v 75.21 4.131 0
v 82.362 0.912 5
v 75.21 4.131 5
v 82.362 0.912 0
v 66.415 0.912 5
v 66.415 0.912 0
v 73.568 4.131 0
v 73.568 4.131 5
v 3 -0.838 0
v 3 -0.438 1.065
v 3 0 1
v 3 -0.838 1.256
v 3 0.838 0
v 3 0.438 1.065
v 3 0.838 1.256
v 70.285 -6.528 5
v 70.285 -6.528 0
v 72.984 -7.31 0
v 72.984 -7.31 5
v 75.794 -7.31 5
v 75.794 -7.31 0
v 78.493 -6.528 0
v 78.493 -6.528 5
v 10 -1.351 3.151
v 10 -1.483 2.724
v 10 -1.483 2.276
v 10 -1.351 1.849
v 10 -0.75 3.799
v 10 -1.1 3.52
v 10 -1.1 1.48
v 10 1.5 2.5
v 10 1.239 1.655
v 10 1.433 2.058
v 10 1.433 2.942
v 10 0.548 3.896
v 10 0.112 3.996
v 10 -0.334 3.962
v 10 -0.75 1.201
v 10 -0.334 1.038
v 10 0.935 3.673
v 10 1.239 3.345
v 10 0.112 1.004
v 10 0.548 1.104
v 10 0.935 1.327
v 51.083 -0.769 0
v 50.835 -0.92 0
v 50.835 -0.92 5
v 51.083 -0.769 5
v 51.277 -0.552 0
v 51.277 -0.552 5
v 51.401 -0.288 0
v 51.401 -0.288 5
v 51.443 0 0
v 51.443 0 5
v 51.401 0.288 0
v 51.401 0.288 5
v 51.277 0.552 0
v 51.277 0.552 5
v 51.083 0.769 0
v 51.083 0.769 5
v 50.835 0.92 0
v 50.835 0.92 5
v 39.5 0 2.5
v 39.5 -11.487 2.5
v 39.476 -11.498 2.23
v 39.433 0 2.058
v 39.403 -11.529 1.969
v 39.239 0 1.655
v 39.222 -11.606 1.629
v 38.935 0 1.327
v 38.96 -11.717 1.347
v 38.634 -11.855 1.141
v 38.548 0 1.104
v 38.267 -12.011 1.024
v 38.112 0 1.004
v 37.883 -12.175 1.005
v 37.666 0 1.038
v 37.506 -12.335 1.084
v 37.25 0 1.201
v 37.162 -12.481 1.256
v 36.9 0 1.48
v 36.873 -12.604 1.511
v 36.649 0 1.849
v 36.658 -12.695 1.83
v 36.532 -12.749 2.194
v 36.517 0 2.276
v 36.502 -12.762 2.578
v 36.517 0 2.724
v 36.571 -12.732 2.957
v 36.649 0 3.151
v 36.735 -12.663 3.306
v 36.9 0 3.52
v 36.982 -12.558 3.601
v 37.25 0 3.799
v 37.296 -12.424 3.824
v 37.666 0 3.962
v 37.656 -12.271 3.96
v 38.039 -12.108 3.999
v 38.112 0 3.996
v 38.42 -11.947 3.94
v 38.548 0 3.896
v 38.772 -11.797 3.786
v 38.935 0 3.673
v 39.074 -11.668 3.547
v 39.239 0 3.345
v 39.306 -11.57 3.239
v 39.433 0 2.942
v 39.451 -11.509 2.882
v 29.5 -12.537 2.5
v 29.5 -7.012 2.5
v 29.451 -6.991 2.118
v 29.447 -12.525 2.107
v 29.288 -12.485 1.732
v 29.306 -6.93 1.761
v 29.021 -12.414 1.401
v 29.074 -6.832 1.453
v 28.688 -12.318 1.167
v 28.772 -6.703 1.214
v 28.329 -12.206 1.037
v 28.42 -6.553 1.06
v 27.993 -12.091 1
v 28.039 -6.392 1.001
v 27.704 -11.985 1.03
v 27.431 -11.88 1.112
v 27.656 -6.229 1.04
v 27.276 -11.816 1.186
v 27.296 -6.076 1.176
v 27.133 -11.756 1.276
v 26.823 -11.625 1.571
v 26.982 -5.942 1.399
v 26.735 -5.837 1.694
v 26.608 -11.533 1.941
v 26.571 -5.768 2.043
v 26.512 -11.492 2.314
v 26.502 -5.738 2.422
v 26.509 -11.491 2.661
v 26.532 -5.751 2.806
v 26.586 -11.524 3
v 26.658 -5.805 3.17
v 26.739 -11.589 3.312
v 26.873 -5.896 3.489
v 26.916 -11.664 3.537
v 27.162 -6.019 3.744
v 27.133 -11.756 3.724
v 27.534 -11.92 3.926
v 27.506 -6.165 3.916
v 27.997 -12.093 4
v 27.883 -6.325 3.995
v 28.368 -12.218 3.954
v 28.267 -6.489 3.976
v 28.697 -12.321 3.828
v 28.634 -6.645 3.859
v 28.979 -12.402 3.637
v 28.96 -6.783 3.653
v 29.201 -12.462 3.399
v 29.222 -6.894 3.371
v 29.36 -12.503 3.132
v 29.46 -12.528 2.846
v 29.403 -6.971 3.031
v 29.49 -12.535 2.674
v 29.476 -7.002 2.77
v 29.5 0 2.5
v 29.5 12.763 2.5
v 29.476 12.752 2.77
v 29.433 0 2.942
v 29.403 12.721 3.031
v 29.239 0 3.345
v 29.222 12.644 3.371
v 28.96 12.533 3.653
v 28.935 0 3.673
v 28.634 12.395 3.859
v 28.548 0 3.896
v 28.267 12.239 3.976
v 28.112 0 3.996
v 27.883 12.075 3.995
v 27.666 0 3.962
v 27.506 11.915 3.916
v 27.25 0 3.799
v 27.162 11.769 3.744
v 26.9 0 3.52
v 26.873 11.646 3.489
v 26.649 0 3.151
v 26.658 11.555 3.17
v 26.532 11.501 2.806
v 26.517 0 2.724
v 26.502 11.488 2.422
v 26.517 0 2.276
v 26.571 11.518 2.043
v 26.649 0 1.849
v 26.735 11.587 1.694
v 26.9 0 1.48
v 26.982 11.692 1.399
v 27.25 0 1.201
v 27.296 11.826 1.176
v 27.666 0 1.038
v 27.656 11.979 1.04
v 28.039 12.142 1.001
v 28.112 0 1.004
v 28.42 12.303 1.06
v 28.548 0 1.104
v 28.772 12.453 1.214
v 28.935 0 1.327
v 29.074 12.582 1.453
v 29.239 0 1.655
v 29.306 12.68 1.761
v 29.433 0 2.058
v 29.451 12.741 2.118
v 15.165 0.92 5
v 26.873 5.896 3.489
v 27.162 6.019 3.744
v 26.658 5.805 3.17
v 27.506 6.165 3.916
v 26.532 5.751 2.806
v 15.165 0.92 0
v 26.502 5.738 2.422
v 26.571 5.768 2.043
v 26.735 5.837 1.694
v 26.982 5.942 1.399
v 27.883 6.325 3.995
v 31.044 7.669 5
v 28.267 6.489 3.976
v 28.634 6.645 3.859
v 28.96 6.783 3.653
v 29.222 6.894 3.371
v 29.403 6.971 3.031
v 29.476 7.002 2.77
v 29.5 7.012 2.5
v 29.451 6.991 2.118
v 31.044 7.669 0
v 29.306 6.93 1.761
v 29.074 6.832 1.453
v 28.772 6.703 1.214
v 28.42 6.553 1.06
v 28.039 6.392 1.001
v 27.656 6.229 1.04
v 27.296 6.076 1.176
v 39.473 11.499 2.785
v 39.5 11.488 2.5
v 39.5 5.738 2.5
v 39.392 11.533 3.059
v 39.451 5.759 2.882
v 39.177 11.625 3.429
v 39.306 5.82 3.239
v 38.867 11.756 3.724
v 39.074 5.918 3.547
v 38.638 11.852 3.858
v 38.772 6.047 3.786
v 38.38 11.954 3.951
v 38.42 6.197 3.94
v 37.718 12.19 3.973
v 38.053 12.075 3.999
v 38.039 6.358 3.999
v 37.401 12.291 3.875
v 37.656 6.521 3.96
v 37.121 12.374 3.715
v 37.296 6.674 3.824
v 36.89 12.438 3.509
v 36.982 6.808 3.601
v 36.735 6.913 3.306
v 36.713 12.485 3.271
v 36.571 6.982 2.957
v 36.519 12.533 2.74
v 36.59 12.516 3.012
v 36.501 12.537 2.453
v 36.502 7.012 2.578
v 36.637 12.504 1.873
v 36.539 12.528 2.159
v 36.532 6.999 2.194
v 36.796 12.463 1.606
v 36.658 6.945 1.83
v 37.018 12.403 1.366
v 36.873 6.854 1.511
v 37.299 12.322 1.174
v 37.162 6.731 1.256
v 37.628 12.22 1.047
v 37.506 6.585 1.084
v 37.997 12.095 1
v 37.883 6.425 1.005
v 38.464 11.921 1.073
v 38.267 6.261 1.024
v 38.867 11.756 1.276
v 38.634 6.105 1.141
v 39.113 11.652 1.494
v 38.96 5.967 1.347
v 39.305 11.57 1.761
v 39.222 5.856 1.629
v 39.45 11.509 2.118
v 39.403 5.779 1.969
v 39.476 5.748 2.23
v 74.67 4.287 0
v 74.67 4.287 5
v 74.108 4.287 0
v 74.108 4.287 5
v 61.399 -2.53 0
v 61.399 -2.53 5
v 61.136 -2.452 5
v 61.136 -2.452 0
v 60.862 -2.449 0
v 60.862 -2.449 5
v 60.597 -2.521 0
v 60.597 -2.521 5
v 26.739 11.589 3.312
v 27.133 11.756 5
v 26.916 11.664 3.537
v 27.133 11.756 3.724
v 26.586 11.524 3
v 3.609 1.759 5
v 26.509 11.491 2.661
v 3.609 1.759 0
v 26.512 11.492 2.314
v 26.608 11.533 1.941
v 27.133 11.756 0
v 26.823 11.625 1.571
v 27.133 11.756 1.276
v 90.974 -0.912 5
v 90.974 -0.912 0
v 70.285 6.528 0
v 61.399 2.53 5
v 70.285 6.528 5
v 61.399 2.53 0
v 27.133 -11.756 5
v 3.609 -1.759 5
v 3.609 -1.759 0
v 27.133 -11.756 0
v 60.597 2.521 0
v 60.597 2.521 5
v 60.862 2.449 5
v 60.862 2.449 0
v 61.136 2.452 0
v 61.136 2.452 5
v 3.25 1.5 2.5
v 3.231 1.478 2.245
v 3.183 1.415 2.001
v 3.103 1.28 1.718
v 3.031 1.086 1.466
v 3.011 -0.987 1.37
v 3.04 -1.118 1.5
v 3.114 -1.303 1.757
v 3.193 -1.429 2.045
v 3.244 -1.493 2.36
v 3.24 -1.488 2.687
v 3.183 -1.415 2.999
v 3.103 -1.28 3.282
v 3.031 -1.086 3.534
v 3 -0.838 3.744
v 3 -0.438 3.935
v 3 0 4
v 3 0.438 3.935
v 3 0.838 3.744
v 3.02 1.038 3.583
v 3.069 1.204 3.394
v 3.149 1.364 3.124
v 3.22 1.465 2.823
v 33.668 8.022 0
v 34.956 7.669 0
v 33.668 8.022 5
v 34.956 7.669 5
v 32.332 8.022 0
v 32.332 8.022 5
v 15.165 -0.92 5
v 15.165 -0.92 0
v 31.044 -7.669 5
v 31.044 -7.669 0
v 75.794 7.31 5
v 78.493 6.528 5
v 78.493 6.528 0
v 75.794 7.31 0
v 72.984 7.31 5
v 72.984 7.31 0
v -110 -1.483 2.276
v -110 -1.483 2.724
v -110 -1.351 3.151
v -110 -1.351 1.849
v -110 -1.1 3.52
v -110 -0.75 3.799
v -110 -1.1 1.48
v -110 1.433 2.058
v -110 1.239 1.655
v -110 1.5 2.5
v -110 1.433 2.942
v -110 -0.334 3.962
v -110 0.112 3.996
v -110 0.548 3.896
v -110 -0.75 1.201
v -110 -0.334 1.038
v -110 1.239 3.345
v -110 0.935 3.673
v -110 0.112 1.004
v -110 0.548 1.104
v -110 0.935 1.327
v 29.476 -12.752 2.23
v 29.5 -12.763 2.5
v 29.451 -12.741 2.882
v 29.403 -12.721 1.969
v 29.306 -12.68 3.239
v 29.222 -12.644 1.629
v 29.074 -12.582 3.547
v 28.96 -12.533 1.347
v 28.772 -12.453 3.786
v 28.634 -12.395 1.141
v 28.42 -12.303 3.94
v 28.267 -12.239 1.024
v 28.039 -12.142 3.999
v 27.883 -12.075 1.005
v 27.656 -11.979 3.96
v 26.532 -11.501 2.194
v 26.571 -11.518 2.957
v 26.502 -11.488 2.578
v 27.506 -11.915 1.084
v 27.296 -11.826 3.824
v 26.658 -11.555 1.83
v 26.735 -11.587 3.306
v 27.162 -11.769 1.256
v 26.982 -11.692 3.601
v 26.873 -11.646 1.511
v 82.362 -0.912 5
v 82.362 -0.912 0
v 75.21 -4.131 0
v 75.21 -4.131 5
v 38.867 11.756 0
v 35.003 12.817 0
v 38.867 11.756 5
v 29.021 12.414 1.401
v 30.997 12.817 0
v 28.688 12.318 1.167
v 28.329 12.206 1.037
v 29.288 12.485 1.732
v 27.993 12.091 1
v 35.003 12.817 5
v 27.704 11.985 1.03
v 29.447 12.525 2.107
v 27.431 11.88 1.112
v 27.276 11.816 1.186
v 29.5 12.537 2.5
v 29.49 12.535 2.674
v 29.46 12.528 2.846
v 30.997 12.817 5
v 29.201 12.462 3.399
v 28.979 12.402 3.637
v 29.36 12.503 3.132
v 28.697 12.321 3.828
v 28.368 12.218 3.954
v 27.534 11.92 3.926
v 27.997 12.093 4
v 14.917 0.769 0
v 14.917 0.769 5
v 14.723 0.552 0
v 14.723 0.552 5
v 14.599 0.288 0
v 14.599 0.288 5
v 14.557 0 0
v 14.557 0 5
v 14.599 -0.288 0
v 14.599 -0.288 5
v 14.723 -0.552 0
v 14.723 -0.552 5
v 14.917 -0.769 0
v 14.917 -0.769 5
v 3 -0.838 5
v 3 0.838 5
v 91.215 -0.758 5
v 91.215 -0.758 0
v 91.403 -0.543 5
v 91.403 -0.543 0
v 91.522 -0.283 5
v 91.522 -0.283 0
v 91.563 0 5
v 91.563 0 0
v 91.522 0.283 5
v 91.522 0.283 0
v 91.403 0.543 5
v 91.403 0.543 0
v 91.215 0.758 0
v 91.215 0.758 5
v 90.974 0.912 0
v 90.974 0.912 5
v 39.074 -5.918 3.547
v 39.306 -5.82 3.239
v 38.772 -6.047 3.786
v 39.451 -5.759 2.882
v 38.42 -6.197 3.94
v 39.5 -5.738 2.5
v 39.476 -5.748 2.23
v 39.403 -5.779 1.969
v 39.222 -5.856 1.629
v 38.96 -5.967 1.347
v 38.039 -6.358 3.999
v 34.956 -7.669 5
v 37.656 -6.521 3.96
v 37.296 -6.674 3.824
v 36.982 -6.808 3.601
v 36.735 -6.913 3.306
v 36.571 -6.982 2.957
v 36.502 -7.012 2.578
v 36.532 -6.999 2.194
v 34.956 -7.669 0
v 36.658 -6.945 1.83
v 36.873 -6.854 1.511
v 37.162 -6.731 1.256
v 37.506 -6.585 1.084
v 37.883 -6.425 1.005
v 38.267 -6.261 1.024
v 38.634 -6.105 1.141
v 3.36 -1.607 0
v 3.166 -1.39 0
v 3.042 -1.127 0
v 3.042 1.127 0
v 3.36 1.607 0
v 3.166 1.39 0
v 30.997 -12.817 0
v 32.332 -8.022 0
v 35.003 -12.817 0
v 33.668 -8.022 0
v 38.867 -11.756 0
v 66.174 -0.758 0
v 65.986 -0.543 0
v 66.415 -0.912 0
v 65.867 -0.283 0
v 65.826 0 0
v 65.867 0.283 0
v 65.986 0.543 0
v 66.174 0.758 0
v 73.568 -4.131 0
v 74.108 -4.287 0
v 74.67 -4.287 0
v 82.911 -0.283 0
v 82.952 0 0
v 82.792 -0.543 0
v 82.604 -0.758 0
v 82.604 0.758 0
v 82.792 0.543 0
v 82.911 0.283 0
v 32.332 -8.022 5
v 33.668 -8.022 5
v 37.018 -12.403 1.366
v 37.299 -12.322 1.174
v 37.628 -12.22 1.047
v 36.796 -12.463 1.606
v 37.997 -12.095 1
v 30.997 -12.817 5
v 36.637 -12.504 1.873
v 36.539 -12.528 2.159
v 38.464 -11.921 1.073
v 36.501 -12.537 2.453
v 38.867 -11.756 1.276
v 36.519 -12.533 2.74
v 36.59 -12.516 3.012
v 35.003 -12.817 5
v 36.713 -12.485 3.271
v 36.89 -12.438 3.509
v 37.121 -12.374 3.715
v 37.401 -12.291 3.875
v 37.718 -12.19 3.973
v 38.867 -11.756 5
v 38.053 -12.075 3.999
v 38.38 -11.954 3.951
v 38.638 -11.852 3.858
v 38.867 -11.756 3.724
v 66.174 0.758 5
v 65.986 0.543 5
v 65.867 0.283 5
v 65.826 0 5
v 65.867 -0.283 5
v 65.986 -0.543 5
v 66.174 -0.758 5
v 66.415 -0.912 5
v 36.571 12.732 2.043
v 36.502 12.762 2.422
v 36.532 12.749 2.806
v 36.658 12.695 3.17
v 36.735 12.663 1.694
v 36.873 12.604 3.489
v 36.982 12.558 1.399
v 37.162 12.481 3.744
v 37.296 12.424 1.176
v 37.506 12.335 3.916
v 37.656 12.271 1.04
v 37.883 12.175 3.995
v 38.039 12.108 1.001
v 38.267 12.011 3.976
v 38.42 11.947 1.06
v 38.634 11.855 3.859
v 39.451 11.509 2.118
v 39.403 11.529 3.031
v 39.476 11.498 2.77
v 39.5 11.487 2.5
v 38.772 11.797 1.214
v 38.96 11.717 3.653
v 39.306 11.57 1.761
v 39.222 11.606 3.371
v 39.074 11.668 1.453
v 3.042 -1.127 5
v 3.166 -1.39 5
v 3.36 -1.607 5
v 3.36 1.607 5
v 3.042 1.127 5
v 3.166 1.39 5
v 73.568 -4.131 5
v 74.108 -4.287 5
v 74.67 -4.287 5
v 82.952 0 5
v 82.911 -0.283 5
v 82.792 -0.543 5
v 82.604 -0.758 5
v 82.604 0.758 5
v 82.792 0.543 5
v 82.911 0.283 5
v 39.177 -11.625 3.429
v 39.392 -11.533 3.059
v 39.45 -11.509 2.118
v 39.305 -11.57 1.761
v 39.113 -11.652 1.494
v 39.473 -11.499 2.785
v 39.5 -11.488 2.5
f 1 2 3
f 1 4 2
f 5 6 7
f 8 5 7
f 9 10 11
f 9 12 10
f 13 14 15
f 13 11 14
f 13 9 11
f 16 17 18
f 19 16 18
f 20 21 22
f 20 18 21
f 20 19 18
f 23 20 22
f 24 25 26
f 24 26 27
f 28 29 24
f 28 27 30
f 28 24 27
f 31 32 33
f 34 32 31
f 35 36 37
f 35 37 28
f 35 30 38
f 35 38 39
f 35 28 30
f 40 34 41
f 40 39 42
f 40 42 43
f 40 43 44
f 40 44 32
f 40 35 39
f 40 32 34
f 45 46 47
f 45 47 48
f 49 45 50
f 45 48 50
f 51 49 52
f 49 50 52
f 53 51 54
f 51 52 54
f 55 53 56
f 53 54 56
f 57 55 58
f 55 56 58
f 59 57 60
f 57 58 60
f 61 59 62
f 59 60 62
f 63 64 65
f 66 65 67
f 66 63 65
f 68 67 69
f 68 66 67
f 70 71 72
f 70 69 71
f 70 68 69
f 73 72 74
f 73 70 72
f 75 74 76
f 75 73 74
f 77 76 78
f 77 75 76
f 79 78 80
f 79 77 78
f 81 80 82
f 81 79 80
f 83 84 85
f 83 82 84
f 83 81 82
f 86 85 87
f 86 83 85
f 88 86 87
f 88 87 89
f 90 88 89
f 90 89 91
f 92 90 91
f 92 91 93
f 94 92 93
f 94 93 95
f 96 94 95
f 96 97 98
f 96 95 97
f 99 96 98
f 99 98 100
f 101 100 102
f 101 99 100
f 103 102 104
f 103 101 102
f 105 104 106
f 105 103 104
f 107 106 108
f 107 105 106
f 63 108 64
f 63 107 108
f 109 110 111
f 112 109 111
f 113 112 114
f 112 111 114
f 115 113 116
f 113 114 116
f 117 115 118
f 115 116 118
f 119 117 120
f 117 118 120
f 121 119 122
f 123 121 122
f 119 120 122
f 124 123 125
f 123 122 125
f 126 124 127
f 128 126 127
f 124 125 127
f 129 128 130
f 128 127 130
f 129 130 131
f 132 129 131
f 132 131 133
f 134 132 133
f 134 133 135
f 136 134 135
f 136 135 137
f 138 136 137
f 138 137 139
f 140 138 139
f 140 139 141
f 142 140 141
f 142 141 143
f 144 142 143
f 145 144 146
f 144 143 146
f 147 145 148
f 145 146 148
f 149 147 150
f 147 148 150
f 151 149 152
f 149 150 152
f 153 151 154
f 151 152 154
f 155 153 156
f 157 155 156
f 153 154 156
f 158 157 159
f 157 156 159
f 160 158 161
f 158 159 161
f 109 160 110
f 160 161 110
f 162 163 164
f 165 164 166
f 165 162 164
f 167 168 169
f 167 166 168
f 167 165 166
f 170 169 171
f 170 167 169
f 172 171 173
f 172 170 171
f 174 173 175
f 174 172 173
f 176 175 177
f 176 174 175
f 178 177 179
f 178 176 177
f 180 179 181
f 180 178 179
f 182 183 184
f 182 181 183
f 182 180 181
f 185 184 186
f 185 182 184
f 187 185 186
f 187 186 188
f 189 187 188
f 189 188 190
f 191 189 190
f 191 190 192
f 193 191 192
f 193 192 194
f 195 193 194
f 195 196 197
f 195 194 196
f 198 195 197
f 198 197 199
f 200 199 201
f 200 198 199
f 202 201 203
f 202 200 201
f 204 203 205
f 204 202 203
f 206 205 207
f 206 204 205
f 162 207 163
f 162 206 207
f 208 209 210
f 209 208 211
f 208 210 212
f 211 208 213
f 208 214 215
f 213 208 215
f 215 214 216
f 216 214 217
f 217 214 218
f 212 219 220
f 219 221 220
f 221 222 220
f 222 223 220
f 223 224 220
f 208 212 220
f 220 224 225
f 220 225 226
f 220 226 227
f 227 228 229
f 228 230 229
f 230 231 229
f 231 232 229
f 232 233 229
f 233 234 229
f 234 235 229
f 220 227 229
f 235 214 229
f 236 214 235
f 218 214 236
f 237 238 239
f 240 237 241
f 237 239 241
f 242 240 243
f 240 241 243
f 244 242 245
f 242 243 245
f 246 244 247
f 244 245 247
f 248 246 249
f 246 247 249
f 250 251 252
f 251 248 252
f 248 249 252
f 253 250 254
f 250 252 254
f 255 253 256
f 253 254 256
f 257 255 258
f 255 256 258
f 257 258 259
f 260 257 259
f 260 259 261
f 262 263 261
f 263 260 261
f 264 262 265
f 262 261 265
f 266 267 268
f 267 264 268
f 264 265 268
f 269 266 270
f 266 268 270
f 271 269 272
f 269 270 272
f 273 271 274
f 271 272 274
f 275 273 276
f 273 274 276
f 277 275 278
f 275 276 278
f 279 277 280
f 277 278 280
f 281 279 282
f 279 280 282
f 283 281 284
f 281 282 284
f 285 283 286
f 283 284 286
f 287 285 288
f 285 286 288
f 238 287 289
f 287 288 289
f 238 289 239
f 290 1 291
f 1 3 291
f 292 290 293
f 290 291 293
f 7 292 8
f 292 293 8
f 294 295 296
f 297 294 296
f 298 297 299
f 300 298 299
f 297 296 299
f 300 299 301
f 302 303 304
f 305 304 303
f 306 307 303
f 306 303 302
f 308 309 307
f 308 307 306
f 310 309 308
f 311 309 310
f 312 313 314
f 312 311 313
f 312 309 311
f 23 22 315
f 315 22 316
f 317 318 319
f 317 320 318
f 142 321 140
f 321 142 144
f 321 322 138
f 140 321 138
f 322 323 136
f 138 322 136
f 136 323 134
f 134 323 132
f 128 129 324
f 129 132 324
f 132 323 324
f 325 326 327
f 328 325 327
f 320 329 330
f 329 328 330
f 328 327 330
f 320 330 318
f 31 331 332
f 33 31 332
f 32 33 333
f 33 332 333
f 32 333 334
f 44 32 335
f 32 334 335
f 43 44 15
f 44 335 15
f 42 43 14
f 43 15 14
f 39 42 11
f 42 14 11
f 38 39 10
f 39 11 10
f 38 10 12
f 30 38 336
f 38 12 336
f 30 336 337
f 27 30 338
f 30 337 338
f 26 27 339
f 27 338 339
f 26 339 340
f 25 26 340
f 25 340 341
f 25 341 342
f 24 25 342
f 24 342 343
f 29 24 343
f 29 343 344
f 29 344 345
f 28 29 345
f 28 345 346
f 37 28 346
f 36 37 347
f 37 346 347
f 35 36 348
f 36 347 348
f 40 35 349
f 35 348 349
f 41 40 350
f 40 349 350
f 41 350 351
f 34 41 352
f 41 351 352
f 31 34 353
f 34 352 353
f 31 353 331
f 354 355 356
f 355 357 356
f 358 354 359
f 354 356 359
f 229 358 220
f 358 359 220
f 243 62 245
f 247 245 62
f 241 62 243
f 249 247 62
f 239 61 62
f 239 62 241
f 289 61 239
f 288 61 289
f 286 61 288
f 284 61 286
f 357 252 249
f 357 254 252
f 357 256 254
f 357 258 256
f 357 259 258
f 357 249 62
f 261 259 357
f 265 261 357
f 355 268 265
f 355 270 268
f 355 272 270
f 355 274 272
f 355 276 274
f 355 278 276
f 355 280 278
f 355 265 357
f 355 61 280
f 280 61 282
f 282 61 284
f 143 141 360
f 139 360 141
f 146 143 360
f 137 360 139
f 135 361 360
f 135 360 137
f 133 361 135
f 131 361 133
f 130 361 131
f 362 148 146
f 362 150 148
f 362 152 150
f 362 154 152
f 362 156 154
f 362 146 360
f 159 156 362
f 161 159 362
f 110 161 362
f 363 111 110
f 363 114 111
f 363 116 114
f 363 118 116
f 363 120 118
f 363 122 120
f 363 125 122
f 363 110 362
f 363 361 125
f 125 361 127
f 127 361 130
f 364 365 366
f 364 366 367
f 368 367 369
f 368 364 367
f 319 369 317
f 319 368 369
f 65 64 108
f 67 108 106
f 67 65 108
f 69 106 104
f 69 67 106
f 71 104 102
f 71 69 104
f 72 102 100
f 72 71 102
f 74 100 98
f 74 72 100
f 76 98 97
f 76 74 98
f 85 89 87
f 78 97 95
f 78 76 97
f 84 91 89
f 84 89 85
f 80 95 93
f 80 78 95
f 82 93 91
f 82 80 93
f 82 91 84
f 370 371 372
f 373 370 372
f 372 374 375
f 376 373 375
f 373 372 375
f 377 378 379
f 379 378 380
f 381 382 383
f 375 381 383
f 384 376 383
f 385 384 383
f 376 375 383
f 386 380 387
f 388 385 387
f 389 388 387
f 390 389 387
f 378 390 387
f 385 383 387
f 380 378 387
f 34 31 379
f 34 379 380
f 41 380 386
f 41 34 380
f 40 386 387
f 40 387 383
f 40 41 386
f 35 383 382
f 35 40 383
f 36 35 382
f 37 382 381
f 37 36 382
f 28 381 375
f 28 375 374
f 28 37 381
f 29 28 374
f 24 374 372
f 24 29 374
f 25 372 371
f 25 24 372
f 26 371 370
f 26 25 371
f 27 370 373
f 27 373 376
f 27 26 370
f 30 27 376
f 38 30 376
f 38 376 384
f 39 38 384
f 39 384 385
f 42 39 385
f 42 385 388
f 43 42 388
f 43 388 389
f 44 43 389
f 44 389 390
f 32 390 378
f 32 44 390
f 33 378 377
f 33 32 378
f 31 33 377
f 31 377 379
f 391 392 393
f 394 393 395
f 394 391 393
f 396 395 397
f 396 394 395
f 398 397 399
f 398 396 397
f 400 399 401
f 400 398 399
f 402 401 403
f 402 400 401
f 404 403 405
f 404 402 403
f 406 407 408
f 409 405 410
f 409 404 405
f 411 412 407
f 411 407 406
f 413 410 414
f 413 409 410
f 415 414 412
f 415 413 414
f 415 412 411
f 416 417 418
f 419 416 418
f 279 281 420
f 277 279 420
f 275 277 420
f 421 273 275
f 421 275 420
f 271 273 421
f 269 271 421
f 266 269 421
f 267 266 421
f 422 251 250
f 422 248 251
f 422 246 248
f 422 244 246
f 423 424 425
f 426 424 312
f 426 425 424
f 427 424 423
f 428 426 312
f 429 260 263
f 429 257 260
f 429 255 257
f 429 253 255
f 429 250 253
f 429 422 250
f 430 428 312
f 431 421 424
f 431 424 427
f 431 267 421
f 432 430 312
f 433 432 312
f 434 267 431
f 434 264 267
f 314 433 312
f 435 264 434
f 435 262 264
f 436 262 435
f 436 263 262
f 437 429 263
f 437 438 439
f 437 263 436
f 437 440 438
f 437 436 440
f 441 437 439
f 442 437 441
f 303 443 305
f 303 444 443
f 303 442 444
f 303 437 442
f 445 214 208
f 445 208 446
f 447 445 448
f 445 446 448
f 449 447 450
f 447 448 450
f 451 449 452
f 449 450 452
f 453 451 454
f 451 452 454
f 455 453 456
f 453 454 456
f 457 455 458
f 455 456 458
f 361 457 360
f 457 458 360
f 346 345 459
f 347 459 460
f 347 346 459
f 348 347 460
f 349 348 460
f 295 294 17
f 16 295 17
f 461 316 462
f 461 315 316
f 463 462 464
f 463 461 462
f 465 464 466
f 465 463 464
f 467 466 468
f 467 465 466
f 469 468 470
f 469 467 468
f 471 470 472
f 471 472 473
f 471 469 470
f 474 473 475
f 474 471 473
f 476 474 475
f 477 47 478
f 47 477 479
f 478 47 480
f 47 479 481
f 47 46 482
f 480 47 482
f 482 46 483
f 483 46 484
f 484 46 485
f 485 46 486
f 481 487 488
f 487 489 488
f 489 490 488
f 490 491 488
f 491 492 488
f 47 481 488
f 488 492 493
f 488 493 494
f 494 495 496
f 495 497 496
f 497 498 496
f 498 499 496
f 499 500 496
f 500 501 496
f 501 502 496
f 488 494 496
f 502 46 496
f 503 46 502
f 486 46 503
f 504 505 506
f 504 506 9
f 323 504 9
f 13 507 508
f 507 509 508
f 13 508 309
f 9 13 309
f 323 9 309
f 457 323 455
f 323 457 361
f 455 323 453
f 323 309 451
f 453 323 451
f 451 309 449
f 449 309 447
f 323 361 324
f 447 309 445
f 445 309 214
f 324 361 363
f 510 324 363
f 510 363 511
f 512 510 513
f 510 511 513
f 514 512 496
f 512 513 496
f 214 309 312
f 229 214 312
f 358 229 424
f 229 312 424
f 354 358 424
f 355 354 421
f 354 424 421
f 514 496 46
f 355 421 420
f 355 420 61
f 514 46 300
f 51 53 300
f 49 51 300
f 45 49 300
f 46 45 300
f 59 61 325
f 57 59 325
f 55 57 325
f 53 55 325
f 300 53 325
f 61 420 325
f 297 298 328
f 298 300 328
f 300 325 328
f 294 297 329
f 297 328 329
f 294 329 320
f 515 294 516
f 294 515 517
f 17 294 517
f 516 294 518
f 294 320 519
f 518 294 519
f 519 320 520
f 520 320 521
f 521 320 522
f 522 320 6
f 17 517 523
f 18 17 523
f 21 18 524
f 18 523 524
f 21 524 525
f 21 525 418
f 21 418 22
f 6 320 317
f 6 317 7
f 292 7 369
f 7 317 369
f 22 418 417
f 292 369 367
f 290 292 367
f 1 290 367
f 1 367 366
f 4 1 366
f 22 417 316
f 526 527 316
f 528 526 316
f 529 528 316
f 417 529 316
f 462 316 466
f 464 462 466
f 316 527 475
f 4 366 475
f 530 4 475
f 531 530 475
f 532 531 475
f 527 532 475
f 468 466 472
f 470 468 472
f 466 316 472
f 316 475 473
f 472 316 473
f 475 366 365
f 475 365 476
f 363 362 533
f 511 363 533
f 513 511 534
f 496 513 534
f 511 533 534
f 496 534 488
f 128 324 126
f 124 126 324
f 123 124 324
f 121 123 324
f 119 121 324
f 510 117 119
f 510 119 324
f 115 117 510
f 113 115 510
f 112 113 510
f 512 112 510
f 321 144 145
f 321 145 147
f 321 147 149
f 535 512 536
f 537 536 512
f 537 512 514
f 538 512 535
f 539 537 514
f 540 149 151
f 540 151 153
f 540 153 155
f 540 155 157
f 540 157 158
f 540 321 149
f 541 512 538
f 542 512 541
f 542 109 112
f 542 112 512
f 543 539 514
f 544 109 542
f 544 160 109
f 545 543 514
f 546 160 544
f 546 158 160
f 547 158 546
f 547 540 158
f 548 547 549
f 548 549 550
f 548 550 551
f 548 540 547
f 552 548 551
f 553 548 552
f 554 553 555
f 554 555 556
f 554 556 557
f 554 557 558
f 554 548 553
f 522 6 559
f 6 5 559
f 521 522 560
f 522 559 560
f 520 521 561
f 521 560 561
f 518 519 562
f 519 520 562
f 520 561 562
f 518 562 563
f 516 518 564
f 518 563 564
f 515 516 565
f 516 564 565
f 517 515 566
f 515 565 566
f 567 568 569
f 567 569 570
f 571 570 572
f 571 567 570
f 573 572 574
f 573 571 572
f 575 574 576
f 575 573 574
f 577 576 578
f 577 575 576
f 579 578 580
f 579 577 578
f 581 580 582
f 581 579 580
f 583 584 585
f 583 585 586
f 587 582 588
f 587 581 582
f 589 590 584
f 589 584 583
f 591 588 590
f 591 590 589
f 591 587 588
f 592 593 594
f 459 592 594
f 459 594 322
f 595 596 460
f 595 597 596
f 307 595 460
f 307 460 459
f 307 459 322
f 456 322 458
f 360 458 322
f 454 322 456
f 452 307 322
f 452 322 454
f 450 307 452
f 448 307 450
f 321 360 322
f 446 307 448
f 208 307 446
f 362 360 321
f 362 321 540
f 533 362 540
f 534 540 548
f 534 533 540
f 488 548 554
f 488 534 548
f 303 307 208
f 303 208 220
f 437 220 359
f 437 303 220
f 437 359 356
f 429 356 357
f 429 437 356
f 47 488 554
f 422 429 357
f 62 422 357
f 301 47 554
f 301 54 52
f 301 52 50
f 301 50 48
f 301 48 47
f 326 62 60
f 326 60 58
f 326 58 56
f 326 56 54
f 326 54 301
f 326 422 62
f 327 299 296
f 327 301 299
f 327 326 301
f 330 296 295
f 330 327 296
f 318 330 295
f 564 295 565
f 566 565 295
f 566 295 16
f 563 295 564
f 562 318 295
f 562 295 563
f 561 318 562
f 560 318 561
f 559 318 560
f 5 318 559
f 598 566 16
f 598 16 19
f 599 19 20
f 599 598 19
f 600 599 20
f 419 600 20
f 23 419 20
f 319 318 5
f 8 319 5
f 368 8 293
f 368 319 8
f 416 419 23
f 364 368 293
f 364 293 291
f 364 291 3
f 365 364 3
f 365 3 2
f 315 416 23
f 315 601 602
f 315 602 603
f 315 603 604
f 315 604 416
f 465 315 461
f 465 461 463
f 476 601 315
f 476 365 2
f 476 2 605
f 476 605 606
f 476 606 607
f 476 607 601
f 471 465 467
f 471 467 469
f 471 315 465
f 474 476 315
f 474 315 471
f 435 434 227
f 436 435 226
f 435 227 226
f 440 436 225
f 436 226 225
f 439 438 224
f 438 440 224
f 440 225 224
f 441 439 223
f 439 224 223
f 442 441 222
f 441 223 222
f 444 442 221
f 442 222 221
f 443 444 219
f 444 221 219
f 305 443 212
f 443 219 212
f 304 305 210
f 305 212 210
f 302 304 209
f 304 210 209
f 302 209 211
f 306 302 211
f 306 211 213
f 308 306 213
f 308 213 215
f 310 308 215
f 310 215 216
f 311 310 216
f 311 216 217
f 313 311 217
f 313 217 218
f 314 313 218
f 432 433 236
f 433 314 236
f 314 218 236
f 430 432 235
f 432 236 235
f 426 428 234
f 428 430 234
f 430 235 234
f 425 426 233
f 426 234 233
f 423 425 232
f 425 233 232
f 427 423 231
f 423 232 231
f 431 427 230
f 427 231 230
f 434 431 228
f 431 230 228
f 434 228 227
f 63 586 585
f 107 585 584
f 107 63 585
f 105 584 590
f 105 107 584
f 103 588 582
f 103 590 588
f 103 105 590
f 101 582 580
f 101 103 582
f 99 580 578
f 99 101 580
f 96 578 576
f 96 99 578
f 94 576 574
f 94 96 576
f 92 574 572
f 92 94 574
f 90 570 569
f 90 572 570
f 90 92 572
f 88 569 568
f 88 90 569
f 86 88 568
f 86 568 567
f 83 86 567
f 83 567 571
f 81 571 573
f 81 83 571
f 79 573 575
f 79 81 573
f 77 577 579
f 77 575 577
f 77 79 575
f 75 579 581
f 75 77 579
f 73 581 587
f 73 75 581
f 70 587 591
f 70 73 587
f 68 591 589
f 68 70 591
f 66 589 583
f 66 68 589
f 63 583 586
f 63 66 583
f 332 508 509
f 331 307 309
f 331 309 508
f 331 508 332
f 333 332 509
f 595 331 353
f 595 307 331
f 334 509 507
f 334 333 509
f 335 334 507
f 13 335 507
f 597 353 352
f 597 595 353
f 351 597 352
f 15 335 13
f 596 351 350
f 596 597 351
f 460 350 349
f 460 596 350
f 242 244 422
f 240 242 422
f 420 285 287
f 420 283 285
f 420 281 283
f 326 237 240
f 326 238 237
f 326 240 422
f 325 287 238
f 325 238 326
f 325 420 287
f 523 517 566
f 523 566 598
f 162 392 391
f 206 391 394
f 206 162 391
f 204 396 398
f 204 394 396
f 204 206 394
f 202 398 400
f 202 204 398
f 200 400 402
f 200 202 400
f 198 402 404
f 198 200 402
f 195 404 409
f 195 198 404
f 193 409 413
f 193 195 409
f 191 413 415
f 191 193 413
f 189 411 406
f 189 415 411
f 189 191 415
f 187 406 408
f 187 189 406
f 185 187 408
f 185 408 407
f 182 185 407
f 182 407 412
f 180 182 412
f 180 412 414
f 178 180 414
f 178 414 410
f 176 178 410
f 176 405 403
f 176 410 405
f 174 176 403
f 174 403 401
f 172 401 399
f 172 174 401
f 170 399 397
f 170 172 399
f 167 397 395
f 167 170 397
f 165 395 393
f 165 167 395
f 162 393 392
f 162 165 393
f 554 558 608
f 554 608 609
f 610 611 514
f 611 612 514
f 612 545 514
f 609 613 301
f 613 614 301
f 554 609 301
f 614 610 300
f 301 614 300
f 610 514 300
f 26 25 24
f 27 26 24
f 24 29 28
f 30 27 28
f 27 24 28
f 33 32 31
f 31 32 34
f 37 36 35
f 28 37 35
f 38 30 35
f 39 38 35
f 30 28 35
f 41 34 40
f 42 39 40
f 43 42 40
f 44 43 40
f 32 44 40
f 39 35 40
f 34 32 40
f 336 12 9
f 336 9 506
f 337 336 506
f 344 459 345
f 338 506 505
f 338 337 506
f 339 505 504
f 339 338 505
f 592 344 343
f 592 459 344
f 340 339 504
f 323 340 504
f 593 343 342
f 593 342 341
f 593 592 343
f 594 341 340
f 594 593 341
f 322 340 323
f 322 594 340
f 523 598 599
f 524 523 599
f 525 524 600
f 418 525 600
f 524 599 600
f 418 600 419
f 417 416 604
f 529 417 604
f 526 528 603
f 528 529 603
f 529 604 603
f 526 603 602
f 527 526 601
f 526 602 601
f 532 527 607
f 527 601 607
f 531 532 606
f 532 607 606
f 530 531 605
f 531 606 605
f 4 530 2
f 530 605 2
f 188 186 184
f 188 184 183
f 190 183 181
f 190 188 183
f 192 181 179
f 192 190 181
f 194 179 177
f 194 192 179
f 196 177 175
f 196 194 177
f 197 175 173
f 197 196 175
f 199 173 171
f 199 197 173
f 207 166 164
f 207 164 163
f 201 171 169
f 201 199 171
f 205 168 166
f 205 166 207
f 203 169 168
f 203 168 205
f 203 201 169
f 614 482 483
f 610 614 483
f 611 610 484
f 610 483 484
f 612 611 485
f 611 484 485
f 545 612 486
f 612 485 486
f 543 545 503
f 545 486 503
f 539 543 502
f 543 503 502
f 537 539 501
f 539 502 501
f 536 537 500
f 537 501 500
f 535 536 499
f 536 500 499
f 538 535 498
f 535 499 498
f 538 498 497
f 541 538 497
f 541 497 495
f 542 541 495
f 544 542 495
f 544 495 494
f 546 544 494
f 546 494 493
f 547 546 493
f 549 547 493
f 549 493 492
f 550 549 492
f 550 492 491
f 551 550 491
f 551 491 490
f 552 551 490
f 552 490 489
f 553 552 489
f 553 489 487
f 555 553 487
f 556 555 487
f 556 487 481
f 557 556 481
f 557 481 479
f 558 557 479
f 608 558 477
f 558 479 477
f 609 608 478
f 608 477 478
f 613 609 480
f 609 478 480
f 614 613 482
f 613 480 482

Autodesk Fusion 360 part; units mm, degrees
sketch "スケッチ1" plane through (0, 0, 0) normal (0, 0, 1) x (1, 0, 0)
  line L0 (0, 0) -> (210, 0) construction
  dimension "d1" = 210
sketch "スケッチ1 (2)" plane through (0, 0, 0) normal (0, 0, 1) x (1, 0, 0) in component "decoration"
  line L0 (0, 0) -> (93, 0) construction
  line L1 (33, 14.25) -> (33, -8.5) construction
  line L2 (13, 0) -> (33, 8.5)
  line L3 (13, 0) -> (33, -8.5)
  line L4 (53, 0) -> (33, 8.5)
  line L5 (53, 0) -> (33, -8.5)
  line L6 (3, 0) -> (3, 1.5)
  line L7 (3, 1.5) -> (33, 14.25)
  line L8 (74.3889, 8.375) -> (74.3889, -4.5) construction
  line L9 (64.3889, 0) -> (74.3889, 4.5)
  line L10 (64.3889, 0) -> (74.3889, -4.5)
  line L11 (84.3889, 0) -> (74.3889, 4.5)
  line L12 (84.3889, 0) -> (74.3889, -4.5)
  line L13 (33, 14.25) -> (61, 2.35)
  line L14 (61, 0) -> (61, 2.35) construction
  line L15 (61, 2.35) -> (74.3889, 8.375)
  line L16 (74.3889, 8.375) -> (93, 0)
  line L17 (3, 0) -> (3, -1.5)
  line L18 (3, -1.5) -> (33, -14.25)
  line L19 (33, -14.25) -> (61, -2.35)
  line L20 (61, -2.35) -> (74.3889, -8.375)
  line L21 (74.3889, -8.375) -> (93, 0)
  dimension "d4" = 93
  dimension "d5" = 17
  dimension "d6" = 13
  dimension "d7" = 20
  dimension "d8" = 1.5
  dimension "d9" = 3
  dimension "d10" = 9
  dimension "d12" = 10
  dimension "d14" = 8
extrude "押し出し2" add sketch "スケッチ1 (2)" along normal blind 5 makes body 1 in component "decoration"
fillet "フィレット1" radius 15 2 edges at (33, -14.25, 2.5) (33, 14.25, 2.5) on bodies 1 in component "decoration"
fillet "フィレット2" radius 10 2 edges at (74.3889, 8.375, 2.5) (74.3889, -8.375, 2.5) on bodies 1 in component "decoration"
fillet "フィレット3" radius 1 1 edges at (93, 0, 2.5) on bodies 1 in component "decoration"
fillet "フィレット4" radius 1 2 edges at (84.3889, 0, 2.5) (64.3889, 0, 2.5) on bodies 1 in component "decoration"
fillet "フィレット5" radius 2 2 edges at (74.3889, 4.5, 2.5) (74.3889, -4.5, 2.5) on bodies 1 in component "decoration"
fillet "フィレット6" radius 1 2 edges at (13, 0, 2.5) (53, 0, 2.5) on bodies 1 in component "decoration"
fillet "フィレット7" radius 5 2 edges at (33, 8.5, 2.5) (33, -8.5, 2.5) on bodies 1 in component "decoration"
fillet "フィレット8" radius 1 1 edges at (61, 2.35, 2.5) on bodies 1 in component "decoration"
fillet "フィレット8" radius 1 1 edges at (61, -2.35, 2.5) on bodies 1 in component "decoration"
fillet "フィレット9" radius 1 2 edges at (3, -1.5, 2.5) (3, 1.5, 2.5) on bodies 1 in component "decoration"
sketch "スケッチ4" plane through (0, 0, 0) normal (0, 1, 0) x (1, 0, 0) in component "decoration"
  line L0 (0, 0) -> (33, 0) construction
  line L1 (33, 0) -> (33, -2.5) construction
  line L2 (28, -2.5) -> (38, -2.5) construction
  circle A0 centre (28, -2.5) radius 1.5
  circle A1 centre (38, -2.5) radius 1.5
  dimension "d44" = 2.5
  dimension "d45" = 33
  dimension "d46" = 10
  dimension "d47" = 3
  dimension "d48" = 3
extrude "押し出し3" cut sketch "スケッチ4" against normal blind 18 bodies 1 in component "decoration"
extrude "押し出し4" cut sketch "スケッチ4" along normal blind 22 bodies 1 in component "decoration"
extrude "押し出し1" add sketch "スケッチ4" along normal up to surface separate body contours A0 end surface through (3, -1.5, 0) normal (-0.391141, -0.920331, 0) offset 0 makes body 2 in component "center piller"
extrude "押し出し2'" add sketch "スケッチ4" along normal up to surface separate body contours A1 end surface through (33, -14.25, 0) normal (0.391141, -0.920331, 0) offset 0 makes body 3 in component "center piller"
extrude "押し出し3'" add sketch "スケッチ4" along normal up to surface contours A0 end surface through (3, 1.5, 0) normal (-0.391141, 0.920331, 0) offset 0 bodies 2 in component "center piller"
extrude "押し出し4'" add sketch "スケッチ4" along normal up to surface contours A1 end surface through (33, 14.25, 0) normal (0.391141, 0.920331, 0) offset 0 bodies 3 in component "center piller"
sketch "スケッチ5" plane through (0, 0, 0) normal (1, 0, 0) x (0, 1, 0) in component "decoration"
  line L0 (0, 0) -> (0, 2.5) construction
  circle A0 centre (0, 2.5) radius 1.5
  dimension "d61" = 2.5
  dimension "d62" = 3
extrude "押し出し5" cut sketch "スケッチ5" along normal blind 10 bodies 1 in component "decoration"
extrude "押し出し1'" add 1 faces at (10, 0.4297, 2.7088) along direction (-1, 0, 0) blind 120 separate body on bodies 1 makes body 4 in component "pin"
component "decoration" placed x (1, 0, 0) y (0, 1, 0) z (0, 0, 1) at (0, 0, 0)
component "center piller" placed x (1, 0, 0) y (0, 1, 0) z (0, 0, 1) at (0, 0, 0)
component "pin" placed x (1, 0, 0) y (0, 1, 0) z (0, 0, 1) at (0, 0, 0)
